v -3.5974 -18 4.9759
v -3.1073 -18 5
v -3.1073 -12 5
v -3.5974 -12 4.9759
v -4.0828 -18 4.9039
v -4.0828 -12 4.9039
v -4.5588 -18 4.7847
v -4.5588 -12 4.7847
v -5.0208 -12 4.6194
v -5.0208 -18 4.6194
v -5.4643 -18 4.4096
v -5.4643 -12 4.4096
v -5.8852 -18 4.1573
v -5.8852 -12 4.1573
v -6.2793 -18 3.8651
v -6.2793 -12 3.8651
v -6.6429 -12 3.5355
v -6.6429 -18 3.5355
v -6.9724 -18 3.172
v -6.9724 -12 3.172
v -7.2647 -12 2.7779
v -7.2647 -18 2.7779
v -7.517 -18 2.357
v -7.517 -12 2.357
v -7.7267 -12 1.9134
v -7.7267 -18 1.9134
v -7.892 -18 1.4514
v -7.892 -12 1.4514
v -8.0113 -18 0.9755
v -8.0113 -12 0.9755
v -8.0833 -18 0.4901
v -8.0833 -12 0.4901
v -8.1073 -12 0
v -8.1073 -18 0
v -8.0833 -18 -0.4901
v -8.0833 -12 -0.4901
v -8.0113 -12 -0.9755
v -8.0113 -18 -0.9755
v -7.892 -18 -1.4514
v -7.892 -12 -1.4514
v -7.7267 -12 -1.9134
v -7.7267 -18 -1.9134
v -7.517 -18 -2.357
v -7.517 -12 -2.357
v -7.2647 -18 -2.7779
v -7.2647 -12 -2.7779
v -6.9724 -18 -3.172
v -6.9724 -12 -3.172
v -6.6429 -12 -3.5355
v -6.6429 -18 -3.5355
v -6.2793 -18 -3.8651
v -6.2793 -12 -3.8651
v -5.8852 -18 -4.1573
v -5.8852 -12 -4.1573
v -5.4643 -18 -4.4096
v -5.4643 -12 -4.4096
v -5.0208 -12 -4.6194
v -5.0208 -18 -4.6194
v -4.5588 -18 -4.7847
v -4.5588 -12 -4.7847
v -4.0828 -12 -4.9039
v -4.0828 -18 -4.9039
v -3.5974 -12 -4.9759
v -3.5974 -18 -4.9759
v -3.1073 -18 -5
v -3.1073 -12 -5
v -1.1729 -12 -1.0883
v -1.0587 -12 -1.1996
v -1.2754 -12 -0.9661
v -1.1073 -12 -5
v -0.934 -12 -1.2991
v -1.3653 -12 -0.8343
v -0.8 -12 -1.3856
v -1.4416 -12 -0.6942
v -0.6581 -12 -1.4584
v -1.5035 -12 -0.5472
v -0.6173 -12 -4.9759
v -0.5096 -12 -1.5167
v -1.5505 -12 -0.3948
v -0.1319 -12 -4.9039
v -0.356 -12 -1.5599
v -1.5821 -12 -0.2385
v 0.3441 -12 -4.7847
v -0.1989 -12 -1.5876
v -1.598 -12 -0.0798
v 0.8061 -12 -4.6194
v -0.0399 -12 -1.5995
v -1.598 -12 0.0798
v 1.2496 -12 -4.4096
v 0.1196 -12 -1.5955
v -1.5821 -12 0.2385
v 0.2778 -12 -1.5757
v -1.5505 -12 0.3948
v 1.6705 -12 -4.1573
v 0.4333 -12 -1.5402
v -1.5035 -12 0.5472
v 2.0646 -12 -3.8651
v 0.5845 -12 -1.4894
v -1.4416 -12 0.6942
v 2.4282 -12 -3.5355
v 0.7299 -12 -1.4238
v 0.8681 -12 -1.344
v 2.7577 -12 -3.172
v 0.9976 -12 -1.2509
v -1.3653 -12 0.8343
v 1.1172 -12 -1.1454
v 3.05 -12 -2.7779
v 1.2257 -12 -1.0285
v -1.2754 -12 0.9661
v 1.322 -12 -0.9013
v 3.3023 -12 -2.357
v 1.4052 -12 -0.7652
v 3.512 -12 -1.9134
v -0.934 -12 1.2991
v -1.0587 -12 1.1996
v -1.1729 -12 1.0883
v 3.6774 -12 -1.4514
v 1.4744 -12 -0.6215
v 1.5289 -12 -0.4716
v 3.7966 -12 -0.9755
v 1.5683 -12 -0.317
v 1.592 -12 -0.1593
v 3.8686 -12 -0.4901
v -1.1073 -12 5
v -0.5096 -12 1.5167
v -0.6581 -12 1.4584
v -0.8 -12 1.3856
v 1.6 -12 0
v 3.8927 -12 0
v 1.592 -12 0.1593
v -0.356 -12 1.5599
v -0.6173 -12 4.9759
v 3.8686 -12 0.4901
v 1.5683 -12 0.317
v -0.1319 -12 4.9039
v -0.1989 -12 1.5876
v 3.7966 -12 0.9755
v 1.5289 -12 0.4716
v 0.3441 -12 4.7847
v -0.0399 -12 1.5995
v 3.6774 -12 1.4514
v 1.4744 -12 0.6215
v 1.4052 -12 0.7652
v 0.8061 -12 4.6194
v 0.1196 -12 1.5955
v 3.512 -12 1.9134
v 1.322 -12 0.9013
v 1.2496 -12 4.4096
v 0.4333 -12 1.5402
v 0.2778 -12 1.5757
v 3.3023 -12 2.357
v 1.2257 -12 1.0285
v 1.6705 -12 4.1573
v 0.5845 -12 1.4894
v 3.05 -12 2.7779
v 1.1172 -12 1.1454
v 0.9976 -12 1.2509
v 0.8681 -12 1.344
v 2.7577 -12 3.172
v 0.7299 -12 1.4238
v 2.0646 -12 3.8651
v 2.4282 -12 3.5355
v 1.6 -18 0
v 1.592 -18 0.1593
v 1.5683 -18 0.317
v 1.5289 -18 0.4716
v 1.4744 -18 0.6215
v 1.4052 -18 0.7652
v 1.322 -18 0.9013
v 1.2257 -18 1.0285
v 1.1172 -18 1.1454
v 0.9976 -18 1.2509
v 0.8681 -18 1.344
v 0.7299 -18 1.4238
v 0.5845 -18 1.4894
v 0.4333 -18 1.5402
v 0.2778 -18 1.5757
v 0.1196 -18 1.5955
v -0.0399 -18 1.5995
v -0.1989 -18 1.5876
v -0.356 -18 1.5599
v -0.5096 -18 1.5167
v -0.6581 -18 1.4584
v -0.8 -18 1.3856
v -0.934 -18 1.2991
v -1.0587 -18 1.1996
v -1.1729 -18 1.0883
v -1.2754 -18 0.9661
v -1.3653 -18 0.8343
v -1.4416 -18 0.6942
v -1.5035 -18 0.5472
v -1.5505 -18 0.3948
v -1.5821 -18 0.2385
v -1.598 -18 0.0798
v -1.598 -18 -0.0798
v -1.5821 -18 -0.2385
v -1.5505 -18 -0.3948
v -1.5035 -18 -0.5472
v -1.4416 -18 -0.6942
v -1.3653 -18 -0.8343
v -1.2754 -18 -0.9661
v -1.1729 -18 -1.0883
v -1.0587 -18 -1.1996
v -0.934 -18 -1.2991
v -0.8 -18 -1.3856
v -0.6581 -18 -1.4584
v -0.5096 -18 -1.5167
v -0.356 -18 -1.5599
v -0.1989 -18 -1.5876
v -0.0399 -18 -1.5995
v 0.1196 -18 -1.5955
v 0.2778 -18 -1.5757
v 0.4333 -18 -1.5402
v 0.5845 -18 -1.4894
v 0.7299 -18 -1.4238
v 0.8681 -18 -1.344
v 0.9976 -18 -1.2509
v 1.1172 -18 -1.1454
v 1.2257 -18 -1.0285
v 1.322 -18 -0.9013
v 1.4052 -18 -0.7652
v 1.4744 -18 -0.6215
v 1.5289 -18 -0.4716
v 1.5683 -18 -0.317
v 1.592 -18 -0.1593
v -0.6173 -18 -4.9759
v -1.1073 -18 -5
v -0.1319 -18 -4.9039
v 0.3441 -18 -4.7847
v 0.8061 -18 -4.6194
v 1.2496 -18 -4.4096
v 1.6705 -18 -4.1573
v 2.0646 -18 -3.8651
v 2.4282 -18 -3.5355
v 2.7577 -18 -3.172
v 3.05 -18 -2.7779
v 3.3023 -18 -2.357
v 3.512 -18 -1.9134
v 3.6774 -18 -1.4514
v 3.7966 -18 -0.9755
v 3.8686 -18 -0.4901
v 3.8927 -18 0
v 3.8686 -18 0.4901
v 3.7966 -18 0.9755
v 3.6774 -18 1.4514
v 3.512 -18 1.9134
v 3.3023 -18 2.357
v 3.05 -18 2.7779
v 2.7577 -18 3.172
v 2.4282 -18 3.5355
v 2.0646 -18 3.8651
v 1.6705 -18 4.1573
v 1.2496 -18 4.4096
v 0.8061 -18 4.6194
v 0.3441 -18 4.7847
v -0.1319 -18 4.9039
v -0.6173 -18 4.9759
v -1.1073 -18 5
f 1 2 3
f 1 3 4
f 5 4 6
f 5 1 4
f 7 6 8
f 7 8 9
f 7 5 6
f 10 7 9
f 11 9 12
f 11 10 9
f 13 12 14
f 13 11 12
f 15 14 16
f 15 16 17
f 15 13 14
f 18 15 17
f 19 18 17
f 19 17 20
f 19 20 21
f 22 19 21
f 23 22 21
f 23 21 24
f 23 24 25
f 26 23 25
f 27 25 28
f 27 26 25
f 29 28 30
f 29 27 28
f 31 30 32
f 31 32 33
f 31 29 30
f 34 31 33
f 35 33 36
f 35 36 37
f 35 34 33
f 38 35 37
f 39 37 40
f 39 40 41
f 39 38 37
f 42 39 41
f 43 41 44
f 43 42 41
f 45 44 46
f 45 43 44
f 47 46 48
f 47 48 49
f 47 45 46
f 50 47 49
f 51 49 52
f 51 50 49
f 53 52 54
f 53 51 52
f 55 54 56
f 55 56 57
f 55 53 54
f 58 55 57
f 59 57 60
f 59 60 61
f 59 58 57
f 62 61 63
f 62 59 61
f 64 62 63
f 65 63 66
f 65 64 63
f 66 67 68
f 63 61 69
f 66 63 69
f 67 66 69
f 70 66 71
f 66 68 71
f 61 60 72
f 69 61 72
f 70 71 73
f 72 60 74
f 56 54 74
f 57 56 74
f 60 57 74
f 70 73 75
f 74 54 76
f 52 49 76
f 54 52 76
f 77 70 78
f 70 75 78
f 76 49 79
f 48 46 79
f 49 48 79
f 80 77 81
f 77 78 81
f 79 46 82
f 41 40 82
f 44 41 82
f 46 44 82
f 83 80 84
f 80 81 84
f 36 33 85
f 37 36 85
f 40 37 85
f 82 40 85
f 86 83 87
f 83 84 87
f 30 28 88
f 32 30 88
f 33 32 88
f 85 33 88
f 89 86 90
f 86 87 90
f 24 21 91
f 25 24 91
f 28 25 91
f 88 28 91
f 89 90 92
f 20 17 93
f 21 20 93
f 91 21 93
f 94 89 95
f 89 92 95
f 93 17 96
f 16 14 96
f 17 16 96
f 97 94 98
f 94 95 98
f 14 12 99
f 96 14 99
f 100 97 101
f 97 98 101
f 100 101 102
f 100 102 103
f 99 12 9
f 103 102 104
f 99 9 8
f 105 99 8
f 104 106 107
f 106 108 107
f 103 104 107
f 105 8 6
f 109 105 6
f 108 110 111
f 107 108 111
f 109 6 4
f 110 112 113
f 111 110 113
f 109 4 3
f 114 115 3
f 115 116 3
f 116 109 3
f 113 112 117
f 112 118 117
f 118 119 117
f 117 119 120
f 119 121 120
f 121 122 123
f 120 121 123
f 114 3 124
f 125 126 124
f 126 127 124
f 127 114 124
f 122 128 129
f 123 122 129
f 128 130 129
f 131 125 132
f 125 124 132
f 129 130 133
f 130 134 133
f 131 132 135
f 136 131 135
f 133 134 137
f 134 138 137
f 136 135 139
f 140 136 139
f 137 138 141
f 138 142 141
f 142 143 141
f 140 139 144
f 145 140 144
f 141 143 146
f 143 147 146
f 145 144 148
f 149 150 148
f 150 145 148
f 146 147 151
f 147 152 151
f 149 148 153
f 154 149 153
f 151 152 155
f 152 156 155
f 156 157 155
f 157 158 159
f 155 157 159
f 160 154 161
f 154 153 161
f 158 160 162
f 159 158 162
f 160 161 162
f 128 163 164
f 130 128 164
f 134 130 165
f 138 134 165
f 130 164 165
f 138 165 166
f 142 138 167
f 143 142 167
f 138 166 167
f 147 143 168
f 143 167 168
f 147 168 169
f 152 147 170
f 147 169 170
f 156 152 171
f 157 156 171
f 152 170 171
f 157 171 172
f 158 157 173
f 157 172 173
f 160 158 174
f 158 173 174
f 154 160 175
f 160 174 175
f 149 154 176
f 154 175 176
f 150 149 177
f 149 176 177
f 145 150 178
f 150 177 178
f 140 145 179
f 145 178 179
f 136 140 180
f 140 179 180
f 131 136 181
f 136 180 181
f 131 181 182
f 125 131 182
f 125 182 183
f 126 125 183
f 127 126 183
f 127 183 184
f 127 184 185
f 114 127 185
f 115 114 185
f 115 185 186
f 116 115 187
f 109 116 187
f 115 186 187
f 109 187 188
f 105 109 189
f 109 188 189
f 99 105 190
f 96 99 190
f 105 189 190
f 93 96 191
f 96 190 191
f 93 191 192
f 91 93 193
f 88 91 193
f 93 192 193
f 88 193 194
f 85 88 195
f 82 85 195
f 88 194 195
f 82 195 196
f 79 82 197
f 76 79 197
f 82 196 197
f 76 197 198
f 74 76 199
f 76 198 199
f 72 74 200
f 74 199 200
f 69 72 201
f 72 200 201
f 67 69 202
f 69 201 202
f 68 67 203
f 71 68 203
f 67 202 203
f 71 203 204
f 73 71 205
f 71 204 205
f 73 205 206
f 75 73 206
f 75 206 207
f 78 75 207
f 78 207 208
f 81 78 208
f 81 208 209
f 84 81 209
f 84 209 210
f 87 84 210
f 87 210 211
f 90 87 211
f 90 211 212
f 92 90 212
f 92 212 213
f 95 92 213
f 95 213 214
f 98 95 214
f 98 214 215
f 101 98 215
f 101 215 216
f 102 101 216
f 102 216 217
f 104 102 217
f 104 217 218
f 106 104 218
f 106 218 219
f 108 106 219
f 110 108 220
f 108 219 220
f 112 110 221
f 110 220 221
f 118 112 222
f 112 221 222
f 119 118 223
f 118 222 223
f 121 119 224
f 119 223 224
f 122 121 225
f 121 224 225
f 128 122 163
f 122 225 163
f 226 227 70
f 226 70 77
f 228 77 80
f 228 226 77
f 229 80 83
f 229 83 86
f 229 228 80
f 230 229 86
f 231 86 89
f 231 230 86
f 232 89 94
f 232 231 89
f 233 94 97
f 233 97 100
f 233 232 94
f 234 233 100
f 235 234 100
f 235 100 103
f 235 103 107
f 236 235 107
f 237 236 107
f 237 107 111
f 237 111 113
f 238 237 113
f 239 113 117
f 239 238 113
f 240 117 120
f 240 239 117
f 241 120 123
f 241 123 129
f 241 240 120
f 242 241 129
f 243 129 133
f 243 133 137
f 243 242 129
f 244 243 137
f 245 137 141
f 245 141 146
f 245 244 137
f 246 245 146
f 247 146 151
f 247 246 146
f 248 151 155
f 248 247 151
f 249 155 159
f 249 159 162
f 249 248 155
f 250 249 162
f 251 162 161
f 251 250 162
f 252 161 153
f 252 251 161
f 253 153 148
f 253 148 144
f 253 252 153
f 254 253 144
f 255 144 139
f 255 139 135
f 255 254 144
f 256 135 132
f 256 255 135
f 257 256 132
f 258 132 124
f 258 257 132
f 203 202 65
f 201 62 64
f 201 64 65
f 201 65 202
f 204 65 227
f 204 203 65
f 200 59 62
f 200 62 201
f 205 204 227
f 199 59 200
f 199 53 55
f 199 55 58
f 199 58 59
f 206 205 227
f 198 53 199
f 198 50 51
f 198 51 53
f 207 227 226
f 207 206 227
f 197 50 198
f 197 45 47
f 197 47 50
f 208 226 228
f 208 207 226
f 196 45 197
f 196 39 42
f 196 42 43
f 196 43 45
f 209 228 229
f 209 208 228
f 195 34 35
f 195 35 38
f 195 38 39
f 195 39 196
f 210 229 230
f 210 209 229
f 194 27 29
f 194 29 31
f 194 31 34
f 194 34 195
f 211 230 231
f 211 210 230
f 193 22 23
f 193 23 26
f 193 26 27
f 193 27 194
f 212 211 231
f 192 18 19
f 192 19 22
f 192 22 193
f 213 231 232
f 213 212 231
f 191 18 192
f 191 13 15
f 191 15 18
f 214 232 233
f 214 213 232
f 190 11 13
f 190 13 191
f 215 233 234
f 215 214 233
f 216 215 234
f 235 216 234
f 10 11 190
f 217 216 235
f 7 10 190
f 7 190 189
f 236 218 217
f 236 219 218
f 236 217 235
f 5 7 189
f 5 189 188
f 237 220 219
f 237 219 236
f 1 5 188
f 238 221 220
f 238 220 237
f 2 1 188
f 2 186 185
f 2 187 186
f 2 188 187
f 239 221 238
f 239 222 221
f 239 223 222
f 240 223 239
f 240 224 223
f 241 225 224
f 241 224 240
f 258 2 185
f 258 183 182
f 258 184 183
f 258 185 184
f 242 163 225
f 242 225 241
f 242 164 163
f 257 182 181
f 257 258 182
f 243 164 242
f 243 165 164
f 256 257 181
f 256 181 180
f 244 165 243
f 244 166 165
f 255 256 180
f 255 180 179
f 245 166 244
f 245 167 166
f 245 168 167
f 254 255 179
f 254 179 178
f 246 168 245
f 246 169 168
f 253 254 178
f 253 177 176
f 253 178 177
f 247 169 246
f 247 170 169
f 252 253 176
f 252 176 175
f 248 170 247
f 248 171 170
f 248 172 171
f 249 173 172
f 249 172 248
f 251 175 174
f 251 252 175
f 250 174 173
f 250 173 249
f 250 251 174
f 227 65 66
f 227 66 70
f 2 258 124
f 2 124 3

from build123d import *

# Parameters (mm, degrees)
ESBO_O1_R                = 1.6
RESSALTO_EXTRUS_O1_DEPTH = 6


with BuildPart() as part:
    # Esboço1 → Ressalto-extrusão1 (new body)
    with BuildSketch(Plane.XZ.offset(18)):
        with BuildLine():
            Line((-3.107348146, -5), (-1.107348146, -5))
            ThreePointArc((-1.107348146, -5), (3.892651854, 0), (-1.107348146, 5))
            Line((-1.107348146, 5), (-3.107348146, 5))
            ThreePointArc((-3.107348146, 5), (-8.107348146, 0), (-3.107348146, -5))
        make_face()
        Circle(ESBO_O1_R, mode=Mode.SUBTRACT)
    extrude(amount=-RESSALTO_EXTRUS_O1_DEPTH)


solid = part.part
